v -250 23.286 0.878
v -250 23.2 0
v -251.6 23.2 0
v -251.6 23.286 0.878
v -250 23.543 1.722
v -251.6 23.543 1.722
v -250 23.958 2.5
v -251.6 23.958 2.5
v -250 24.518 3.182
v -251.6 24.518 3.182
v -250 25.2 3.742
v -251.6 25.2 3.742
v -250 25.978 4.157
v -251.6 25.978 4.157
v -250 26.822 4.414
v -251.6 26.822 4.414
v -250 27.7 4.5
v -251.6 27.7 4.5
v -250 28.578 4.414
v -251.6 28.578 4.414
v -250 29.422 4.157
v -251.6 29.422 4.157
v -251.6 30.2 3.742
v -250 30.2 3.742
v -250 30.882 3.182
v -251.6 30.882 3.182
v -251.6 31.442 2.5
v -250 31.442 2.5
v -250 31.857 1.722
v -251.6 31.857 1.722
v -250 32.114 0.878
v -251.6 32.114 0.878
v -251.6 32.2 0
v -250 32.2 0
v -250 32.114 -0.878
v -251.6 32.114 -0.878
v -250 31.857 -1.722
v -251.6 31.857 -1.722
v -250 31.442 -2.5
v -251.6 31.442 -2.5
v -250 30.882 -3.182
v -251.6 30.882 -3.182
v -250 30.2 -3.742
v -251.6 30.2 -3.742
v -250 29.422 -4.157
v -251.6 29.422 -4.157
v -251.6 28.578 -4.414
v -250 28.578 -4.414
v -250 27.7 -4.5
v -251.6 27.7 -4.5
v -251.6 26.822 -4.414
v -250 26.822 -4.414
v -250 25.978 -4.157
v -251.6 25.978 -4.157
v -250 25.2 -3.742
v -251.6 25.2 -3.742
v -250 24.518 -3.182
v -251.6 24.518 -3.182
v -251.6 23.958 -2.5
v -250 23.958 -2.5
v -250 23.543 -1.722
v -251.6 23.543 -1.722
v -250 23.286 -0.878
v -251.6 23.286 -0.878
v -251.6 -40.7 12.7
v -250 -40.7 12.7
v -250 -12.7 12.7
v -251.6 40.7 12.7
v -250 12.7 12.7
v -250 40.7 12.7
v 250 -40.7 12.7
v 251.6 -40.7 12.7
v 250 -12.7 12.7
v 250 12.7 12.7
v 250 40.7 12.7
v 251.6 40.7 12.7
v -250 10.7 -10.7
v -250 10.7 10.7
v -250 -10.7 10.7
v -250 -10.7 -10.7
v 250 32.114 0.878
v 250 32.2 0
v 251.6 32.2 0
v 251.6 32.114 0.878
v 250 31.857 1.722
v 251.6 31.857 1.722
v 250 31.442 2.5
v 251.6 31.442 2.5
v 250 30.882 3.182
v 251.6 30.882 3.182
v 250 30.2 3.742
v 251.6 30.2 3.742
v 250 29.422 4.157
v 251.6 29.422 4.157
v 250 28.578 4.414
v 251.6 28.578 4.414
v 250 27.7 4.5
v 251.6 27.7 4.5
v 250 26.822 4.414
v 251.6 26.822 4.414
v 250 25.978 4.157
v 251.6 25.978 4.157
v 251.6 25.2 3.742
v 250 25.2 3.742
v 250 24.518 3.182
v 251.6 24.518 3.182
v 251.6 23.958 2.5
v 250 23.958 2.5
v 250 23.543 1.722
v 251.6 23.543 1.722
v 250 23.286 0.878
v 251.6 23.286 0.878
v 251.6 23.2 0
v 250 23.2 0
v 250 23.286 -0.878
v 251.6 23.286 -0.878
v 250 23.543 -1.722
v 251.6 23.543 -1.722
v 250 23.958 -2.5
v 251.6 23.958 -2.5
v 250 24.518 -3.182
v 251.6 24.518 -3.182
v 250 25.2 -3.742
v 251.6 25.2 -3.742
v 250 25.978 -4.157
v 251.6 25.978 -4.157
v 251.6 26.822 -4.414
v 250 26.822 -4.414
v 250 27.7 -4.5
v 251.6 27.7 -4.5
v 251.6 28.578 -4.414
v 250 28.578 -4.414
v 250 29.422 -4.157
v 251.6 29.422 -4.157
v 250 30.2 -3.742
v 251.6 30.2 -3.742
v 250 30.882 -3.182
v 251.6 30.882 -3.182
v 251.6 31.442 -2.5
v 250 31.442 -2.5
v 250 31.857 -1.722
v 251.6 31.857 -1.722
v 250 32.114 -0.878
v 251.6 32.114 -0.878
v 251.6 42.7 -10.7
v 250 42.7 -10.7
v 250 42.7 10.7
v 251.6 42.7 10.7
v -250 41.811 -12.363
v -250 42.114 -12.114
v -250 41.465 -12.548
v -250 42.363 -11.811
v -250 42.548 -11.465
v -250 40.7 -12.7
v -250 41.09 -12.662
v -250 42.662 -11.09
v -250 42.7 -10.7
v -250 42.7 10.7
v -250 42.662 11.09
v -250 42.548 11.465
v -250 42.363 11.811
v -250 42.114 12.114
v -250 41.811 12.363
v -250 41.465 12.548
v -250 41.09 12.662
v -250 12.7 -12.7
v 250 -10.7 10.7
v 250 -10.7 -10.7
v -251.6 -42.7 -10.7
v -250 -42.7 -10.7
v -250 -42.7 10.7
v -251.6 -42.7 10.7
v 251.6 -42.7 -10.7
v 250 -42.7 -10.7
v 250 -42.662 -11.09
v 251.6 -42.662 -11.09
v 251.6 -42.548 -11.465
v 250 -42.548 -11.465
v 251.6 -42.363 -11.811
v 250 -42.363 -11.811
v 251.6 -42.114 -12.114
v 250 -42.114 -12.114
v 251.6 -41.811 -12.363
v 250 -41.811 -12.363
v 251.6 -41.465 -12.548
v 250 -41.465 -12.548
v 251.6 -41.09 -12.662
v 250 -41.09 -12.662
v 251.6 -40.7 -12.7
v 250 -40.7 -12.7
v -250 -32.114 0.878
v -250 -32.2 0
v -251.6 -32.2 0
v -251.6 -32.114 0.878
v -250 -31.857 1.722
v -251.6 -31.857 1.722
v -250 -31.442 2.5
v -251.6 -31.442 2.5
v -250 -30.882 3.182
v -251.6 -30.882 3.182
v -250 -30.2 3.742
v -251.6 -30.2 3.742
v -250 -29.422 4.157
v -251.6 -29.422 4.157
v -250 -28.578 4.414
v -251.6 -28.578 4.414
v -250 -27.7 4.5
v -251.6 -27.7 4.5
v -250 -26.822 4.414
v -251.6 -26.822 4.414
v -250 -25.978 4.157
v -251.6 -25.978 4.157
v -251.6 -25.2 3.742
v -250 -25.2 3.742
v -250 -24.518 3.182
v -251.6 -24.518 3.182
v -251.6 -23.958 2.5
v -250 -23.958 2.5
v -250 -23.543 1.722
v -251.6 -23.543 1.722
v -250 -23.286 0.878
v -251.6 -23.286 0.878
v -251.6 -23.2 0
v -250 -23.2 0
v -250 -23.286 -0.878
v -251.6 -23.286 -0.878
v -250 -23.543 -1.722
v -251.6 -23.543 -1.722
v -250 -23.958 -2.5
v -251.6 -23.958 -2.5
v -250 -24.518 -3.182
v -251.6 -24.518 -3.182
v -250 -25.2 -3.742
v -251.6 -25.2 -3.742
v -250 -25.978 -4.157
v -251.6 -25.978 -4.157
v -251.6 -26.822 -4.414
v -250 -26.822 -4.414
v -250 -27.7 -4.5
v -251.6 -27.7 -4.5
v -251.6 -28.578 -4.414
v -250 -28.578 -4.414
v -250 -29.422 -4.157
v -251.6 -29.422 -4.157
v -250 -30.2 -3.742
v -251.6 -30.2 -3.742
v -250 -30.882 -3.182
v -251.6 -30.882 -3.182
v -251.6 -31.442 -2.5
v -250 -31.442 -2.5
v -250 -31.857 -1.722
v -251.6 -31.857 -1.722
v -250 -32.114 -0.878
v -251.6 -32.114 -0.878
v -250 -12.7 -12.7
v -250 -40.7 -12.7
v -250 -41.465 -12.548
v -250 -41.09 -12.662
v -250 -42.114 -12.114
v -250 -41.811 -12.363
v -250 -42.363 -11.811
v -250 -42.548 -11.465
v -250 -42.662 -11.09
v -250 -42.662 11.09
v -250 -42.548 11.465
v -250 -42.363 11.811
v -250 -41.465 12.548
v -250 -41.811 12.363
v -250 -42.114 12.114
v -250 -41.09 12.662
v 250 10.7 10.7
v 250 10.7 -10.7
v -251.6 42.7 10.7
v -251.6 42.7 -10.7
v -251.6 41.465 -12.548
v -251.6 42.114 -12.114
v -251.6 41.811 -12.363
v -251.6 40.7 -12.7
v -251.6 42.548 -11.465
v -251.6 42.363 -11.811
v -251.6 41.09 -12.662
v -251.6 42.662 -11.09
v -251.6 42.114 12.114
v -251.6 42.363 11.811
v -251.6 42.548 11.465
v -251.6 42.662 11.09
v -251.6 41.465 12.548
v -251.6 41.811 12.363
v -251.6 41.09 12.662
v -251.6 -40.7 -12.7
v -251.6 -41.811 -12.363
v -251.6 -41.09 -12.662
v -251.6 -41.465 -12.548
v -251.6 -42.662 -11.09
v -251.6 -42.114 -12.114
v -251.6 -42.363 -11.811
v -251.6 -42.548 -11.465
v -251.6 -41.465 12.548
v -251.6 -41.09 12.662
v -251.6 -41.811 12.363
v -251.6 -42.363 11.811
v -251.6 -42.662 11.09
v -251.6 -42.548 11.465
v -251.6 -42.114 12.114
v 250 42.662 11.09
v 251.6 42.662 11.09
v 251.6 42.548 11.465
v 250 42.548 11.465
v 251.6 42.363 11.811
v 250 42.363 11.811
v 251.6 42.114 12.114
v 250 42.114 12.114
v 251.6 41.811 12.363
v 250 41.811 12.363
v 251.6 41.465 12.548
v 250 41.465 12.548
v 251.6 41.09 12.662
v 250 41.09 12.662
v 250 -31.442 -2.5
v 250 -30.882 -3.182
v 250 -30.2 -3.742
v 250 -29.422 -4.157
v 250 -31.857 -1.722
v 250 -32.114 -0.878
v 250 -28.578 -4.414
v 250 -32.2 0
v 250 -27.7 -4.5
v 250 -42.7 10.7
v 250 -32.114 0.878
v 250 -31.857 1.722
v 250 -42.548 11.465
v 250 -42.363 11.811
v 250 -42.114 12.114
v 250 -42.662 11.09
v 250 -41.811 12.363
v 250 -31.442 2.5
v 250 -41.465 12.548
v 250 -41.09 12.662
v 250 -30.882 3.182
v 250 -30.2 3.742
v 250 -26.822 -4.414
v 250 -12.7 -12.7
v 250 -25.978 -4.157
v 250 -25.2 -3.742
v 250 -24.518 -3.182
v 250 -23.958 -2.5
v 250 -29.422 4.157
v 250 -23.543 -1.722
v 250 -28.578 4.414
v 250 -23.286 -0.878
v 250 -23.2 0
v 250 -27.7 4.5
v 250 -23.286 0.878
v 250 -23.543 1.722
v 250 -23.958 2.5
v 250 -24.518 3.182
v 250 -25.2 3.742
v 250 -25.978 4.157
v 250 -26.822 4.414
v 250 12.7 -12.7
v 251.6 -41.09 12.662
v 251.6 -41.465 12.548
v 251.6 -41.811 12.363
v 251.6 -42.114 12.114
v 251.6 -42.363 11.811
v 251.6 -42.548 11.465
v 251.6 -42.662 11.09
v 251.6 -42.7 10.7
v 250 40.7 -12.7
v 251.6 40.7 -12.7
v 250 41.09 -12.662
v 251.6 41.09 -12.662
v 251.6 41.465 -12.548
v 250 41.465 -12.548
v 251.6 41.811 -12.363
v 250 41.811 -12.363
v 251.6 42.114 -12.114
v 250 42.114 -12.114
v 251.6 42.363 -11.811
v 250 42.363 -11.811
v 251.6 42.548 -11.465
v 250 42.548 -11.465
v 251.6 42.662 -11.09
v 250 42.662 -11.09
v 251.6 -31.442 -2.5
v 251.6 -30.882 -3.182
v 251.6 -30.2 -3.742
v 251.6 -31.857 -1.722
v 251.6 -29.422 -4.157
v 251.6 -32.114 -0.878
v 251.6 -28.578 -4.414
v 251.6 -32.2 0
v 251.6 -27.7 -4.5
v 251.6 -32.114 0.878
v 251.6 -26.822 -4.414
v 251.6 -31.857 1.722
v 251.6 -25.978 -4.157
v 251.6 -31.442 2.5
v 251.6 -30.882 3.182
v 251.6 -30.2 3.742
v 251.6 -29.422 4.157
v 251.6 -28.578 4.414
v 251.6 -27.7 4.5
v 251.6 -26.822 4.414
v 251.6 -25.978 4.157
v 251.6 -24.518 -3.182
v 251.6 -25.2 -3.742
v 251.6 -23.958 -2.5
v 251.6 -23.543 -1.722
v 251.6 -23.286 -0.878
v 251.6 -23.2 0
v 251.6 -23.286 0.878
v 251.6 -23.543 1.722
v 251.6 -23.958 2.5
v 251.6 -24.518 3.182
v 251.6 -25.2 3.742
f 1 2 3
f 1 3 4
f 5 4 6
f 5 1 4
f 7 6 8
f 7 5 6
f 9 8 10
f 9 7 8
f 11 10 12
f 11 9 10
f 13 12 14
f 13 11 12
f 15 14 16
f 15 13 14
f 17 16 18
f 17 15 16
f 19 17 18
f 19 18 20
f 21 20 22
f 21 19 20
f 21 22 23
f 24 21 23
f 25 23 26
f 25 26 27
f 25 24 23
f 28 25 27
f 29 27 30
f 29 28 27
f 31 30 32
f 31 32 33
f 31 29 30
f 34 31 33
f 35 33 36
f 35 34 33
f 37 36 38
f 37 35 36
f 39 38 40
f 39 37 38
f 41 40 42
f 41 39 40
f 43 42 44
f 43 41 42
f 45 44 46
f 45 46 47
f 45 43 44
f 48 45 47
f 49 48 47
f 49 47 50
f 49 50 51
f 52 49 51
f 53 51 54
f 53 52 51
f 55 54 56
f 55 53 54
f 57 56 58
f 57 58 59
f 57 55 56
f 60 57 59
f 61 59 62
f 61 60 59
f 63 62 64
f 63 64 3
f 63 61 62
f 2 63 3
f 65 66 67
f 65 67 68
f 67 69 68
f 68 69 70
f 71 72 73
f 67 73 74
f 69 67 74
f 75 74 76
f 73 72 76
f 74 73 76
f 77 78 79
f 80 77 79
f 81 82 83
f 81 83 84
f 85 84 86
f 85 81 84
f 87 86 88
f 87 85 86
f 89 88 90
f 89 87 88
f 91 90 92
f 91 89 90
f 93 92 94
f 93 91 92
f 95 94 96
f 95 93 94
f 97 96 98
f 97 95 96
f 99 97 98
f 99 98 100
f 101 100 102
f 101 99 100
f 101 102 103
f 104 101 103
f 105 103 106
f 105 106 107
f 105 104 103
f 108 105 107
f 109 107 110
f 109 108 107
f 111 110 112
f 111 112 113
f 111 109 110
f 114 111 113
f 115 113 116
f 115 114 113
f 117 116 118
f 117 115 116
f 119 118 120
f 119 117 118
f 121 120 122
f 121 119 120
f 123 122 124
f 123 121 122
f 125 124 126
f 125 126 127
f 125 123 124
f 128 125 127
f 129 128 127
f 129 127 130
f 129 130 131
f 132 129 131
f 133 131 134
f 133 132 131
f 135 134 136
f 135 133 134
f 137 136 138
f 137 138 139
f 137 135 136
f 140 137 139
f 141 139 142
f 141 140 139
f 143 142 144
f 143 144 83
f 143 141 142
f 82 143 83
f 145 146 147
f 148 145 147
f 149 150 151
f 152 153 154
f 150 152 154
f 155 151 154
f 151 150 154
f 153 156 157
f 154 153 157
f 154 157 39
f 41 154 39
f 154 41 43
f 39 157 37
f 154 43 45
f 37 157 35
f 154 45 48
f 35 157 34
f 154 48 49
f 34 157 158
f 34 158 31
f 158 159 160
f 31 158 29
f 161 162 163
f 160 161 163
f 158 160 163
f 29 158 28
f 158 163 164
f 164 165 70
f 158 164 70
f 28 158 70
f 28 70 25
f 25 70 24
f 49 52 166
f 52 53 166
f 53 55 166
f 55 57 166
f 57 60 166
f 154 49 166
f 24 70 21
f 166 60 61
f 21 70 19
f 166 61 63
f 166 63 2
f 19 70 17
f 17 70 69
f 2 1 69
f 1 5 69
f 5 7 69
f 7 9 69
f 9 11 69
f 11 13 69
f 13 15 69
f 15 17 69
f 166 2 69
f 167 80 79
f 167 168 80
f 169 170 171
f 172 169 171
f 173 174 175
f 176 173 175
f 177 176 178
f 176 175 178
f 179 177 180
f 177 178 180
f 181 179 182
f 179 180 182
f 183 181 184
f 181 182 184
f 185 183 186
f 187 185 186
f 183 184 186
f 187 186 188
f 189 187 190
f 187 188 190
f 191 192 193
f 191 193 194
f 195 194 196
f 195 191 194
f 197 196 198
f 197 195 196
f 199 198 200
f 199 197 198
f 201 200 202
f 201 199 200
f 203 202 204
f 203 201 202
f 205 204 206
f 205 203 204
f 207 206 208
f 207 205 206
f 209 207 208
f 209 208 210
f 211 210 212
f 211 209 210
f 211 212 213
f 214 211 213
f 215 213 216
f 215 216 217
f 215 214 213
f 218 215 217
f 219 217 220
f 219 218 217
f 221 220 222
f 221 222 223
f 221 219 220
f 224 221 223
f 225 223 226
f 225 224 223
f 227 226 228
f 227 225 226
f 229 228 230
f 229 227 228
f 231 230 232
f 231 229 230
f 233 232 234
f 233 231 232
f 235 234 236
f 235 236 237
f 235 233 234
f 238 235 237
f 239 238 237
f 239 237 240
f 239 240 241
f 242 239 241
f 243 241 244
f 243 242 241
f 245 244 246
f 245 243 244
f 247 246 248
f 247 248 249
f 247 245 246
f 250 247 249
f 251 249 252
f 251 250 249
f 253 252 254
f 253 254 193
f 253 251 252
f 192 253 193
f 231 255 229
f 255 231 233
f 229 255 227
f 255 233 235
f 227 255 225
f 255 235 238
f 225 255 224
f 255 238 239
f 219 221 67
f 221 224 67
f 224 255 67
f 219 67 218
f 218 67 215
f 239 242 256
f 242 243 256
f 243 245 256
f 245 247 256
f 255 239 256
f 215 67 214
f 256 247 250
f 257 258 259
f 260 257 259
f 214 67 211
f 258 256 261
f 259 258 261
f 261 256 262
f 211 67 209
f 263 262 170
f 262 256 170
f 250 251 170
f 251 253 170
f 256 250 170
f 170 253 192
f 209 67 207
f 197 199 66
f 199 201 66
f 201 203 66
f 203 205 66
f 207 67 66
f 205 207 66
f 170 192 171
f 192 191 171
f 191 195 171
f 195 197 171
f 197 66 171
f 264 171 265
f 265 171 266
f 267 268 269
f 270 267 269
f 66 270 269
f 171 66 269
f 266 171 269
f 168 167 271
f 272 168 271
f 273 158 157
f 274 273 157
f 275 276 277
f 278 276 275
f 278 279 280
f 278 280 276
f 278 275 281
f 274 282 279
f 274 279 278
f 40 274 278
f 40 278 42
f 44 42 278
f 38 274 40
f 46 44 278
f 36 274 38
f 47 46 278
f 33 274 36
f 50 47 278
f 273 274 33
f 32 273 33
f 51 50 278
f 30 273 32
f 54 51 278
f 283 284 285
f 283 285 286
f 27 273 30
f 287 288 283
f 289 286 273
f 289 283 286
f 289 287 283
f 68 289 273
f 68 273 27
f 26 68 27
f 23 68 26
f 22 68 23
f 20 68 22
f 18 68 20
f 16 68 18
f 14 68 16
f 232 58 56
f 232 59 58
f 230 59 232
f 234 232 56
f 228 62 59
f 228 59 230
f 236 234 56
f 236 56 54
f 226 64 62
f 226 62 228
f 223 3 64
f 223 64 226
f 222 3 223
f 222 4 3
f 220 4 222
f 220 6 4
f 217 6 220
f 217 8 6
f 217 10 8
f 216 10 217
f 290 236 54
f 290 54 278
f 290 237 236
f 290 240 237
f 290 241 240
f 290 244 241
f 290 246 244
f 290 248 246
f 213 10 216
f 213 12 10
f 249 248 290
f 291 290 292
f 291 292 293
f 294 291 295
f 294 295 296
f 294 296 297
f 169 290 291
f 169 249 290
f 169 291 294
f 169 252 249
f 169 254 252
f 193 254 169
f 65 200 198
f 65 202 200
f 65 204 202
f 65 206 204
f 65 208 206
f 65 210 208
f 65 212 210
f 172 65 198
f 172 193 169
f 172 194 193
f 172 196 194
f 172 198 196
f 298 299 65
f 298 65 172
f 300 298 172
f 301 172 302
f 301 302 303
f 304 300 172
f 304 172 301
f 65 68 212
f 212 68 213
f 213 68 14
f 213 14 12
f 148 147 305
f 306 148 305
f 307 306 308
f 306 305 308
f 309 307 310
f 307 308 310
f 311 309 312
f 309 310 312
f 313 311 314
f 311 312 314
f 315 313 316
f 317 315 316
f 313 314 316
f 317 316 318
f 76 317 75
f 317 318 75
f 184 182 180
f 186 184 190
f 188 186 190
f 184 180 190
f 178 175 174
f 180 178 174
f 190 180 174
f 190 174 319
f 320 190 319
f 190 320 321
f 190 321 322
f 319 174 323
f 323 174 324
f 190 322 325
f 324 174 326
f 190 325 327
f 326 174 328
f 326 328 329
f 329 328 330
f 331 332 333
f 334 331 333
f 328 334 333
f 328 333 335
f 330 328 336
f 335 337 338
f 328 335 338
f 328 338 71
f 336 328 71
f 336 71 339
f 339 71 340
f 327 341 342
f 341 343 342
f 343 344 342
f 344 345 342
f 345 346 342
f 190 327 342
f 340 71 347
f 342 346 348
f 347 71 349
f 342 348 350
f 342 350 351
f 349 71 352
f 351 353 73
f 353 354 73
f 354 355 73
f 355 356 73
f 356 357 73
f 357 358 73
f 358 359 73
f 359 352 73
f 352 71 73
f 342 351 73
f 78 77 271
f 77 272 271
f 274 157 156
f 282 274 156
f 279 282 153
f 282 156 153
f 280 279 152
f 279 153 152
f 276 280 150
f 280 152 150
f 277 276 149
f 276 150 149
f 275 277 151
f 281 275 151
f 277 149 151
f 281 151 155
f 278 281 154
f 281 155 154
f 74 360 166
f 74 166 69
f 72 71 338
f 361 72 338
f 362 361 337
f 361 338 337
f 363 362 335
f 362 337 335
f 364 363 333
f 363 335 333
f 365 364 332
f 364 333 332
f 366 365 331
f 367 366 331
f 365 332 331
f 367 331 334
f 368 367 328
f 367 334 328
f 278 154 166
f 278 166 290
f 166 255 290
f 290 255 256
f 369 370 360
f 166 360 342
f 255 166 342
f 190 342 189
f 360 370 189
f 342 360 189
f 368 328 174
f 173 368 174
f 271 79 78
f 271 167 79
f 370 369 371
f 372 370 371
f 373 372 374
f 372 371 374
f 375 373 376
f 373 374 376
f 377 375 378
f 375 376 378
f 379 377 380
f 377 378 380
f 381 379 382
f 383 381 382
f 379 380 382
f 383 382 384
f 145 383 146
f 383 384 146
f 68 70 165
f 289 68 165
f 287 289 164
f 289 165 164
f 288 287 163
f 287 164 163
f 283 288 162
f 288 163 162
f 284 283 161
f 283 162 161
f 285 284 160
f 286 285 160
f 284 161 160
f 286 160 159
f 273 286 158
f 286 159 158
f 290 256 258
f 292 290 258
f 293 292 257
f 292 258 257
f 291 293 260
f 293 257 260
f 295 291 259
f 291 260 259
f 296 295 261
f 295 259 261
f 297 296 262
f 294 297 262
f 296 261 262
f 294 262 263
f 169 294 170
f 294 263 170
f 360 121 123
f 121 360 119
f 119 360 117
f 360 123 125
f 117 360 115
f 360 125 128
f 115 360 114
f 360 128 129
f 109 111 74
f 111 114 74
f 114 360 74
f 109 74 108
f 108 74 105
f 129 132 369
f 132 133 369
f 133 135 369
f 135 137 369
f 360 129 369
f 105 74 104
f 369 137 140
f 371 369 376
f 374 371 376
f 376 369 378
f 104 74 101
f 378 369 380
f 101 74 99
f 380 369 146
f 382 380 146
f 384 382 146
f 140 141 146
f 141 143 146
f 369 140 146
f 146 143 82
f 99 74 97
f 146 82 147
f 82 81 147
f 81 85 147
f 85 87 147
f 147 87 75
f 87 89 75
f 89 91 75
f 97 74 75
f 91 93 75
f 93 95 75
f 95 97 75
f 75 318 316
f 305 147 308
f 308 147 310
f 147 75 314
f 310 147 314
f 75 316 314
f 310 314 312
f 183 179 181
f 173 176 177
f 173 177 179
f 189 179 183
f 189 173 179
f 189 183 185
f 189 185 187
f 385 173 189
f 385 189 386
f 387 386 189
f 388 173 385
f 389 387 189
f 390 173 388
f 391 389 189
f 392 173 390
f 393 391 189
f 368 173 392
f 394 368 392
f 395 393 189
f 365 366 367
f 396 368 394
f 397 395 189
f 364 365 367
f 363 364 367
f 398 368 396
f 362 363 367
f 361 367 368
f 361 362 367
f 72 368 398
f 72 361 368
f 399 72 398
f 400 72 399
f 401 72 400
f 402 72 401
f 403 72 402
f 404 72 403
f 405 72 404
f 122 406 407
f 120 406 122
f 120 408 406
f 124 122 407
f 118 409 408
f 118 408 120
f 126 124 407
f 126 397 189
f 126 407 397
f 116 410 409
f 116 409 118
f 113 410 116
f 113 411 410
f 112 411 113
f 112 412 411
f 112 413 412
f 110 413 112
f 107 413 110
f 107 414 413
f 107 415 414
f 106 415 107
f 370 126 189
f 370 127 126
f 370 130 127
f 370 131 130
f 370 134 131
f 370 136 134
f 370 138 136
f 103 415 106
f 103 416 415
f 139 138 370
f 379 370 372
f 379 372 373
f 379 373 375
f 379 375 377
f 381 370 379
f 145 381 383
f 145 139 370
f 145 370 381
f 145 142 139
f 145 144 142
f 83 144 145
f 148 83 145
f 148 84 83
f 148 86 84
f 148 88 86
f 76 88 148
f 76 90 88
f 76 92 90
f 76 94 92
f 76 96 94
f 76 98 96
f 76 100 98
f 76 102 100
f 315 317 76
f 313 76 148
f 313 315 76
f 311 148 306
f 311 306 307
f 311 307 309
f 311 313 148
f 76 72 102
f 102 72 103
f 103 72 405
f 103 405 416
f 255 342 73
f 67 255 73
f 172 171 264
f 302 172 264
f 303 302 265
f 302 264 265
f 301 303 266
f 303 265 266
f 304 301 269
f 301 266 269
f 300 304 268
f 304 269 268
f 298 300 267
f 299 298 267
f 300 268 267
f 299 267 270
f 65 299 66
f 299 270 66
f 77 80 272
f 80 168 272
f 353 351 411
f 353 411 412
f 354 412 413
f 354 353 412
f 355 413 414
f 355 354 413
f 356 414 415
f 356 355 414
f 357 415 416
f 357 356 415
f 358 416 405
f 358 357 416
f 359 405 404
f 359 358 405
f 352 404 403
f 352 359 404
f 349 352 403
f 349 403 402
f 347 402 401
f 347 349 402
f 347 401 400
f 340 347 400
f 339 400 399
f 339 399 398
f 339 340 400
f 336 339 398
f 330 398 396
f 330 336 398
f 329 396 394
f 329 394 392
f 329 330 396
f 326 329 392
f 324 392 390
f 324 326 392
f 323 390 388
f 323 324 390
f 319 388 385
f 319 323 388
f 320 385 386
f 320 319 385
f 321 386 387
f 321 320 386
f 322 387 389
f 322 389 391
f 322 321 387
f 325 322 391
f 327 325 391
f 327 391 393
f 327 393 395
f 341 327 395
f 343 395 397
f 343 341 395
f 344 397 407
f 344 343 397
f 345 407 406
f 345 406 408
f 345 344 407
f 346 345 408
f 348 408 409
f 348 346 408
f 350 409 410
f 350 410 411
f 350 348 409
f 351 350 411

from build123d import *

# Parameters (mm, degrees)
F0_W     = 25.4
F0_H     = 25.4
F1_DEPTH = 250
F2_T     = -2
F3_R     = 4.5
F4_DEPTH = 1.6
F5_R     = 4.5
F6_DEPTH = 1.6


with BuildPart() as f1:
    # F0 (on Right) → F1 (new body, symmetric)
    with BuildSketch(Plane.YZ):
        Rectangle(F0_W, F0_H)
    extrude(amount=F1_DEPTH, both=True)

    # F2
    f2_openings = [f1.faces().sort_by_distance(p)[0] for p in [
        (250, 0, 0),
        (-250, 0, 0),
    ]]
    offset(amount=F2_T, openings=f2_openings)

    # F3 (on face) → F4 (join)
    with BuildSketch(Plane.YZ.offset(250)):
        with BuildLine():
            ThreePointArc((42.7, 10.7), (42.114214, 12.114214), (40.7, 12.7))
            Line((40.7, 12.7), (-40.7, 12.7))
            ThreePointArc((-40.7, 12.7), (-42.114214, 12.114214), (-42.7, 10.7))
            Line((-42.7, 10.7), (-42.7, -10.7))
            ThreePointArc((-42.7, -10.7), (-42.114214, -12.114214), (-40.7, -12.7))
            Line((-40.7, -12.7), (40.7, -12.7))
            ThreePointArc((40.7, -12.7), (42.114214, -12.114214), (42.7, -10.7))
            Line((42.7, -10.7), (42.7, 10.7))
        make_face()
        with Locations((-27.7, 0)):
            Circle(F3_R, mode=Mode.SUBTRACT)
        with Locations((27.7, 0)):
            Circle(F3_R, mode=Mode.SUBTRACT)
    extrude(amount=F4_DEPTH)

    # F5 (on face) → F6 (join)
    with BuildSketch(Plane(origin=(-250, 0, 0), x_dir=(0, -1, 0), z_dir=(-1, 0, 0))):
        with BuildLine():
            Line((-12.7, 12.7), (-40.7, 12.7))
            ThreePointArc((-40.7, 12.7), (-42.114214, 12.114214), (-42.7, 10.7))
            Line((-42.7, 10.7), (-42.7, -10.7))
            ThreePointArc((-42.7, -10.7), (-42.114214, -12.114214), (-40.7, -12.7))
            Line((-40.7, -12.7), (-12.7, -12.7))
            Line((-12.7, -12.7), (-12.7, 12.7))
        make_face()
        with Locations((-27.7, 0)):
            Circle(F5_R, mode=Mode.SUBTRACT)
        with BuildLine():
            Line((12.7, 12.7), (-12.7, 12.7))
            Line((-12.7, 12.7), (-12.7, -12.7))
            Line((-12.7, -12.7), (12.7, -12.7))
            Line((12.7, -12.7), (40.7, -12.7))
            ThreePointArc((40.7, -12.7), (42.114214, -12.114214), (42.7, -10.7))
            Line((42.7, -10.7), (42.7, 10.7))
            ThreePointArc((42.7, 10.7), (42.114214, 12.114214), (40.7, 12.7))
            Line((40.7, 12.7), (12.7, 12.7))
        make_face()
        with Locations((27.7, 0)):
            Circle(F5_R, mode=Mode.SUBTRACT)
    extrude(amount=F6_DEPTH)


solid = f1.part
